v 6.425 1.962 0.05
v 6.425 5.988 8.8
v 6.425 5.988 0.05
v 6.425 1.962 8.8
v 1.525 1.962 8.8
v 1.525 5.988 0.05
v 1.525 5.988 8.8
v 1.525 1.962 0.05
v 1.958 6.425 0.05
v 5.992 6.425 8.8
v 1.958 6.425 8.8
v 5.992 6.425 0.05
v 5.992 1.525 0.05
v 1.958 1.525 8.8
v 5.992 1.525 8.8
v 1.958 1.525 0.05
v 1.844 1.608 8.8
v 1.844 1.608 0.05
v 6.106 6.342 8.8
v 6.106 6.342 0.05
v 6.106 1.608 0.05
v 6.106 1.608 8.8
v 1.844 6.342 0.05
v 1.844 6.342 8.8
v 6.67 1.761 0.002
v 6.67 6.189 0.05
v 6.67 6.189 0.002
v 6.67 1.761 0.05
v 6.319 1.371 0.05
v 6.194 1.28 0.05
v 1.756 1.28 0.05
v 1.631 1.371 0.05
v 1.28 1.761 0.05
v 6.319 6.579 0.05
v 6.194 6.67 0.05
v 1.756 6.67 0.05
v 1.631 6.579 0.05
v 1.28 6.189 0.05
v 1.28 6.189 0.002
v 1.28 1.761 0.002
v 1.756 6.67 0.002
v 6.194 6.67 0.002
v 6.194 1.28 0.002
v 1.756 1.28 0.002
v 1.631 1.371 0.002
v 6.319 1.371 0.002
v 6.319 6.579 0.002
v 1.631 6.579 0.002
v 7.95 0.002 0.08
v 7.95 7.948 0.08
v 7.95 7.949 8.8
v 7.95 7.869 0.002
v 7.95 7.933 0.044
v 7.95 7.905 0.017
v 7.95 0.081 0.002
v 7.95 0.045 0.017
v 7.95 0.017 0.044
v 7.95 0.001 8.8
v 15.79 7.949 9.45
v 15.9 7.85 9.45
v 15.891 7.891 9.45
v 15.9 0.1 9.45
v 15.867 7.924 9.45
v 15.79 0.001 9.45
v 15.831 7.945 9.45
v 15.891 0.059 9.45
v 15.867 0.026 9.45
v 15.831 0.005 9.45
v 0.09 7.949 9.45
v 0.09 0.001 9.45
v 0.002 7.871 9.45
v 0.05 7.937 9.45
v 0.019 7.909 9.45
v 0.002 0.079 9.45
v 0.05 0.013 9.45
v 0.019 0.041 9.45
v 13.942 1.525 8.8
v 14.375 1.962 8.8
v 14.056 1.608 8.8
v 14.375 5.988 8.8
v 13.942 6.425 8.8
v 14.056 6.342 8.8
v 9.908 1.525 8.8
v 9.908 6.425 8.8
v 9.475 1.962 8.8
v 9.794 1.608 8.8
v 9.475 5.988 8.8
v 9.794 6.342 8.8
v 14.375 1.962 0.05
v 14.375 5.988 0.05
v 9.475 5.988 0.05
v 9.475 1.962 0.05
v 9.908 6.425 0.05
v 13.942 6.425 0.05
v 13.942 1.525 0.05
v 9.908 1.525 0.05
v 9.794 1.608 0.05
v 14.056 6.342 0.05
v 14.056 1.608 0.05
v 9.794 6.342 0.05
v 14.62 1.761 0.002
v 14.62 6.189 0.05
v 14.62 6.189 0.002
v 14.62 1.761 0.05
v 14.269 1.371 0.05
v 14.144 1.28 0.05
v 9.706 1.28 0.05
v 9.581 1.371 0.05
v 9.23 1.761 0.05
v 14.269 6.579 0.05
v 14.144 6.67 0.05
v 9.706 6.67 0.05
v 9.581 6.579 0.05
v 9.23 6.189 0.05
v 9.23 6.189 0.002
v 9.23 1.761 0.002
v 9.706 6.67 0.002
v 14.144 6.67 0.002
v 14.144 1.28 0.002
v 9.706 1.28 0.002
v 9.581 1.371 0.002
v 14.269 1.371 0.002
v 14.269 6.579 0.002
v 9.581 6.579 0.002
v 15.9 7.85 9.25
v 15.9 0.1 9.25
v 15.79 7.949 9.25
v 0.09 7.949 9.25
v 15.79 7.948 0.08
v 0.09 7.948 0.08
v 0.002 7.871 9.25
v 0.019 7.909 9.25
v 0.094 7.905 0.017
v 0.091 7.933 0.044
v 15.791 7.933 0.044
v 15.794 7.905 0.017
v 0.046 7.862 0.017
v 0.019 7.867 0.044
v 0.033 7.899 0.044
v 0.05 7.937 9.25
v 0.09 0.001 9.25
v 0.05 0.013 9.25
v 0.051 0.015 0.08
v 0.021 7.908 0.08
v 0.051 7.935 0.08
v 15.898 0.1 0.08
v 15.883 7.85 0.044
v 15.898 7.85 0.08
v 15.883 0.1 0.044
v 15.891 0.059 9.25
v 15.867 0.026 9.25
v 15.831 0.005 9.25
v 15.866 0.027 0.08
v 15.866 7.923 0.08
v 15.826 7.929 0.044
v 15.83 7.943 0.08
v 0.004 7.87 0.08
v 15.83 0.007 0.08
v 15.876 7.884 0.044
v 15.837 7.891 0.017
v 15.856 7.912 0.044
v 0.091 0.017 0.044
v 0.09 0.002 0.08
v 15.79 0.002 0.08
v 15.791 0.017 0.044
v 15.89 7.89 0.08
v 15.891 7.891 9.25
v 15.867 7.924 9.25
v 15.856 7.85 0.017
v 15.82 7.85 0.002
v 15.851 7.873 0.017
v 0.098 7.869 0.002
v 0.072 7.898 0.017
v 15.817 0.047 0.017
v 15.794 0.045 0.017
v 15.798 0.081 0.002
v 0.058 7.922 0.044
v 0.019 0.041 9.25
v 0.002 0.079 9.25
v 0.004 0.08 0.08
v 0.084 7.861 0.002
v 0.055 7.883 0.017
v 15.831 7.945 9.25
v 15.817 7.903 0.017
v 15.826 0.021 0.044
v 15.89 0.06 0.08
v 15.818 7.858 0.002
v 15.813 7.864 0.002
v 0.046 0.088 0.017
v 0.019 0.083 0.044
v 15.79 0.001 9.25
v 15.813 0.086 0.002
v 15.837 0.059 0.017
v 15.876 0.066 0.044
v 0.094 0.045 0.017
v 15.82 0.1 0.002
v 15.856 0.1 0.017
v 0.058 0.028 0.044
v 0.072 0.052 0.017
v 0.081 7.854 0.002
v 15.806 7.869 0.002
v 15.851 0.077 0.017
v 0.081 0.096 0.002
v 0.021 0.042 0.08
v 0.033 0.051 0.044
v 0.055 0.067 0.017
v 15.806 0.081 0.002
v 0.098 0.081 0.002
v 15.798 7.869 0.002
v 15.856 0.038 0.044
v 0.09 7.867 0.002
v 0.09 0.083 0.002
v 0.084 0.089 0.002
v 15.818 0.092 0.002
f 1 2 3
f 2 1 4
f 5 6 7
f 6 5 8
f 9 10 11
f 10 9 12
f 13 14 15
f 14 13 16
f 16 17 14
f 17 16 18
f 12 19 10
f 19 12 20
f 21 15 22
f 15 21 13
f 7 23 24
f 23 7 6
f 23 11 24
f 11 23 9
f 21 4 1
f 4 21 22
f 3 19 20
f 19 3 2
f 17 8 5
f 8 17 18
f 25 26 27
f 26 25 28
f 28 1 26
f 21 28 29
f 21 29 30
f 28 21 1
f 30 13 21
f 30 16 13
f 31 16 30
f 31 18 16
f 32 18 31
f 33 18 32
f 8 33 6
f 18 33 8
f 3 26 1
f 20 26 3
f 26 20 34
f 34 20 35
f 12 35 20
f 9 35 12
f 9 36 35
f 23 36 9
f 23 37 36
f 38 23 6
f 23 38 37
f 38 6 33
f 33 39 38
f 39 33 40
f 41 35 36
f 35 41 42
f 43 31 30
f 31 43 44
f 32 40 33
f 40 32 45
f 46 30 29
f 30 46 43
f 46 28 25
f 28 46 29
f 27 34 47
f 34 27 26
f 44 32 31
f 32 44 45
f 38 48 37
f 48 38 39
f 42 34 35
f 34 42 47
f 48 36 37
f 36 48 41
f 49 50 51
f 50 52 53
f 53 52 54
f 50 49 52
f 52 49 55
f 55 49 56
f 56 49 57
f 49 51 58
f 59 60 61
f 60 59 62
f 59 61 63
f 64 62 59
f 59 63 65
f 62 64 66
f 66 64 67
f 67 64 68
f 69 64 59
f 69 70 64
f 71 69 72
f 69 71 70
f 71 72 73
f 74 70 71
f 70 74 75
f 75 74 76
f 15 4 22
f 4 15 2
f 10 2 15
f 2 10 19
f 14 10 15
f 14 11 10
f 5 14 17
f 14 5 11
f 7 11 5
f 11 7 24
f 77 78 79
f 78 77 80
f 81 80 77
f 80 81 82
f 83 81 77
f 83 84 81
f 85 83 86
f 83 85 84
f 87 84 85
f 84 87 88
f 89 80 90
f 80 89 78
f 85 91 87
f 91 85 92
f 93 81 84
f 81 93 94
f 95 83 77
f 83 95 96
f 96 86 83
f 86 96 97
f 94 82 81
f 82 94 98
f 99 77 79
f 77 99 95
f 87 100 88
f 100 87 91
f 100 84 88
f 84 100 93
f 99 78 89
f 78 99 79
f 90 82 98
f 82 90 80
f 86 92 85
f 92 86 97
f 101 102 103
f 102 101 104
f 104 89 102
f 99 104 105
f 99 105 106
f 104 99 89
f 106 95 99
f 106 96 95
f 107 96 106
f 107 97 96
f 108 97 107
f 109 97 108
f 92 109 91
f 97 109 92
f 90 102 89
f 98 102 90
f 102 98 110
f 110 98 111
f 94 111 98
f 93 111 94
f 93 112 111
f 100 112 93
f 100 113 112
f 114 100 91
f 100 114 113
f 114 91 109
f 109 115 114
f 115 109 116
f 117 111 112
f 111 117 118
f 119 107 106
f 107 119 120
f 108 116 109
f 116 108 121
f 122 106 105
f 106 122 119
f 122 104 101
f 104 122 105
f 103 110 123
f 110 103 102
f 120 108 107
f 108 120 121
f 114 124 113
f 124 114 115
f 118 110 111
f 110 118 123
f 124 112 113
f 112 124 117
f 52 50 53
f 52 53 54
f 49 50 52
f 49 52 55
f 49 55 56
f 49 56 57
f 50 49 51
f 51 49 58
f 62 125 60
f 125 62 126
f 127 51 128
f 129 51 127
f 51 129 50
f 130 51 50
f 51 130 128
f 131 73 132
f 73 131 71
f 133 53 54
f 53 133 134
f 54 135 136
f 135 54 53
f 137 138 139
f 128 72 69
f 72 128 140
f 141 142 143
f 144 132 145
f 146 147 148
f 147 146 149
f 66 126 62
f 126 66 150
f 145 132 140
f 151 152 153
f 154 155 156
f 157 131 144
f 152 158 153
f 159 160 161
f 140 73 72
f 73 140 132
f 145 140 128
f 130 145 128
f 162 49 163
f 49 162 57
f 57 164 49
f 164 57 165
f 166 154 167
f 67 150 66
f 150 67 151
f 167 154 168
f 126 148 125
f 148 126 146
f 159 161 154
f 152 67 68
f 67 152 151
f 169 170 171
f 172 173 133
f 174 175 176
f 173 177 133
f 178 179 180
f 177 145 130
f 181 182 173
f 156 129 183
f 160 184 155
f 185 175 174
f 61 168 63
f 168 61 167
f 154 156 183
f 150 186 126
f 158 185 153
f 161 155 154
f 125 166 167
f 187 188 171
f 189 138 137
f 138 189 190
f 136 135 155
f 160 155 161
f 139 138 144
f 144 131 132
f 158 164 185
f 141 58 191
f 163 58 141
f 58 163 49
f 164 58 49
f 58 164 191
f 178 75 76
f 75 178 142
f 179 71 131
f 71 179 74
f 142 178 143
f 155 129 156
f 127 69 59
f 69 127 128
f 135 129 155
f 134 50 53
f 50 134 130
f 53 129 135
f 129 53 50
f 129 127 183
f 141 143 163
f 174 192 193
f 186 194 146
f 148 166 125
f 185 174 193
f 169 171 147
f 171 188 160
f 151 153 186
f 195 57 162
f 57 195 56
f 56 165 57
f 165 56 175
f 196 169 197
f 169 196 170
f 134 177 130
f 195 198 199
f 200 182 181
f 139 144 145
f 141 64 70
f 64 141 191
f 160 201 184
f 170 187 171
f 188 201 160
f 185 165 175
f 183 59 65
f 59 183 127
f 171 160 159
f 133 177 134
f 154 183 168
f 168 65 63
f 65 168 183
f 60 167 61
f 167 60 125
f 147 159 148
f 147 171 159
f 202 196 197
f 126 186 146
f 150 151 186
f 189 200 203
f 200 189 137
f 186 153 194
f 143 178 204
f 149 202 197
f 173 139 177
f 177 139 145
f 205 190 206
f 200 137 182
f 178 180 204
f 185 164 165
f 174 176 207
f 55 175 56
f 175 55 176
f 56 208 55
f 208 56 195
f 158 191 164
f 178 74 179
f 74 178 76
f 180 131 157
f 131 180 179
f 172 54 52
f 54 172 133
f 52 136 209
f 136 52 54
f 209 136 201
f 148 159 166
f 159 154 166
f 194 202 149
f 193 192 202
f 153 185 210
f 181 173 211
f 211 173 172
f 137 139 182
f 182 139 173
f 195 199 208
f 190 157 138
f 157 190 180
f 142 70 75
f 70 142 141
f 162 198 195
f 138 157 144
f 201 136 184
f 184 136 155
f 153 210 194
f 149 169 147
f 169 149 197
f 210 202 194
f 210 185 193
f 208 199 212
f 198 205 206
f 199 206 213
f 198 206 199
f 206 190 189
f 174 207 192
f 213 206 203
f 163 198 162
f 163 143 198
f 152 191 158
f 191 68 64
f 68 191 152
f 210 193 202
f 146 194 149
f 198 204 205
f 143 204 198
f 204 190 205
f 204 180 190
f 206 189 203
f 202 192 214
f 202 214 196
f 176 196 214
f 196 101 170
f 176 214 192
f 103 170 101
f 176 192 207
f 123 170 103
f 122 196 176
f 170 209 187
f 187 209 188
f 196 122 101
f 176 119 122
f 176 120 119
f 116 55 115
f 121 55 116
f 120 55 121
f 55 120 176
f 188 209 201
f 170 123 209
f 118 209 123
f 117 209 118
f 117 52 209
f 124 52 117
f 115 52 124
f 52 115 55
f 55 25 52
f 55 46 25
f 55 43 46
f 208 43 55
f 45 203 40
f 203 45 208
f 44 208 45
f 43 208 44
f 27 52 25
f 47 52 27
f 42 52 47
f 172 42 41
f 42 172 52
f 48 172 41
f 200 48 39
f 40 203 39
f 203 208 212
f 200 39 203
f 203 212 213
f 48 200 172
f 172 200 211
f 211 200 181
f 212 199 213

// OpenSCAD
// file: ../lib/roundedcube_simple.scad
module roundedcube_simple(size = [1, 1, 1], center = false, radius = 0.5, resolution = 20) {
	// If single value, convert to [x, y, z] vector
	size = (size[0] == undef) ? [size, size, size] : size;

	translate = (center == false) ?
		[radius, radius, radius] :
		[
			radius - (size[0] / 2),
			radius - (size[1] / 2),
			radius - (size[2] / 2)
	];

	translate(v = translate)
	minkowski() {
		cube(size = [
			size[0] - (radius * 2),
			size[1] - (radius * 2),
			size[2] - (radius * 2)
		]);
		sphere(r = radius, $fn = resolution);
	}
}
// file: ../lib/roundedcube.scad
// More information: https://danielupshaw.com/openscad-rounded-corners/

// Set to 0.01 for higher definition curves (renders slower)
$fs = 0.15;

module roundedcube(size = [1, 1, 1], center = false, radius = 0.5, apply_to = "all", resolution = 20) {
	// If single value, convert to [x, y, z] vector
	size = (size[0] == undef) ? [size, size, size] : size;

	translate_min = radius;
	translate_xmax = size[0] - radius;
	translate_ymax = size[1] - radius;
	translate_zmax = size[2] - radius;

	diameter = radius * 2;

	obj_translate = (center == false) ?
		[0, 0, 0] : [
			-(size[0] / 2),
			-(size[1] / 2),
			-(size[2] / 2)
		];

	translate(v = obj_translate) {
		hull() {
			for (translate_x = [translate_min, translate_xmax]) {
				x_at = (translate_x == translate_min) ? "min" : "max";
				for (translate_y = [translate_min, translate_ymax]) {
					y_at = (translate_y == translate_min) ? "min" : "max";
					for (translate_z = [translate_min, translate_zmax]) {
						z_at = (translate_z == translate_min) ? "min" : "max";

						translate(v = [translate_x, translate_y, translate_z])
						if (
							(apply_to == "all") ||
							(apply_to == "xmin" && x_at == "min") || (apply_to == "xmax" && x_at == "max") ||
							(apply_to == "ymin" && y_at == "min") || (apply_to == "ymax" && y_at == "max") ||
							(apply_to == "zmin" && z_at == "min") || (apply_to == "zmax" && z_at == "max")
						) {
							sphere(r = radius, $fn = resolution);
						} else {
							rotate = 
								(apply_to == "xmin" || apply_to == "xmax" || apply_to == "x") ? [0, 90, 0] : (
								(apply_to == "ymin" || apply_to == "ymax" || apply_to == "y") ? [90, 90, 0] :
								[0, 0, 0]
							);
							rotate(a = rotate)
							cylinder(h = diameter, r = radius, center = true, $fn = resolution);
						}
					}
				}
			}
		}
	}
}
// main file
echo(version=version());

include <../lib/block.scad>;

block(baseLayers=3, grid=[2,1], withKnobs=false);
